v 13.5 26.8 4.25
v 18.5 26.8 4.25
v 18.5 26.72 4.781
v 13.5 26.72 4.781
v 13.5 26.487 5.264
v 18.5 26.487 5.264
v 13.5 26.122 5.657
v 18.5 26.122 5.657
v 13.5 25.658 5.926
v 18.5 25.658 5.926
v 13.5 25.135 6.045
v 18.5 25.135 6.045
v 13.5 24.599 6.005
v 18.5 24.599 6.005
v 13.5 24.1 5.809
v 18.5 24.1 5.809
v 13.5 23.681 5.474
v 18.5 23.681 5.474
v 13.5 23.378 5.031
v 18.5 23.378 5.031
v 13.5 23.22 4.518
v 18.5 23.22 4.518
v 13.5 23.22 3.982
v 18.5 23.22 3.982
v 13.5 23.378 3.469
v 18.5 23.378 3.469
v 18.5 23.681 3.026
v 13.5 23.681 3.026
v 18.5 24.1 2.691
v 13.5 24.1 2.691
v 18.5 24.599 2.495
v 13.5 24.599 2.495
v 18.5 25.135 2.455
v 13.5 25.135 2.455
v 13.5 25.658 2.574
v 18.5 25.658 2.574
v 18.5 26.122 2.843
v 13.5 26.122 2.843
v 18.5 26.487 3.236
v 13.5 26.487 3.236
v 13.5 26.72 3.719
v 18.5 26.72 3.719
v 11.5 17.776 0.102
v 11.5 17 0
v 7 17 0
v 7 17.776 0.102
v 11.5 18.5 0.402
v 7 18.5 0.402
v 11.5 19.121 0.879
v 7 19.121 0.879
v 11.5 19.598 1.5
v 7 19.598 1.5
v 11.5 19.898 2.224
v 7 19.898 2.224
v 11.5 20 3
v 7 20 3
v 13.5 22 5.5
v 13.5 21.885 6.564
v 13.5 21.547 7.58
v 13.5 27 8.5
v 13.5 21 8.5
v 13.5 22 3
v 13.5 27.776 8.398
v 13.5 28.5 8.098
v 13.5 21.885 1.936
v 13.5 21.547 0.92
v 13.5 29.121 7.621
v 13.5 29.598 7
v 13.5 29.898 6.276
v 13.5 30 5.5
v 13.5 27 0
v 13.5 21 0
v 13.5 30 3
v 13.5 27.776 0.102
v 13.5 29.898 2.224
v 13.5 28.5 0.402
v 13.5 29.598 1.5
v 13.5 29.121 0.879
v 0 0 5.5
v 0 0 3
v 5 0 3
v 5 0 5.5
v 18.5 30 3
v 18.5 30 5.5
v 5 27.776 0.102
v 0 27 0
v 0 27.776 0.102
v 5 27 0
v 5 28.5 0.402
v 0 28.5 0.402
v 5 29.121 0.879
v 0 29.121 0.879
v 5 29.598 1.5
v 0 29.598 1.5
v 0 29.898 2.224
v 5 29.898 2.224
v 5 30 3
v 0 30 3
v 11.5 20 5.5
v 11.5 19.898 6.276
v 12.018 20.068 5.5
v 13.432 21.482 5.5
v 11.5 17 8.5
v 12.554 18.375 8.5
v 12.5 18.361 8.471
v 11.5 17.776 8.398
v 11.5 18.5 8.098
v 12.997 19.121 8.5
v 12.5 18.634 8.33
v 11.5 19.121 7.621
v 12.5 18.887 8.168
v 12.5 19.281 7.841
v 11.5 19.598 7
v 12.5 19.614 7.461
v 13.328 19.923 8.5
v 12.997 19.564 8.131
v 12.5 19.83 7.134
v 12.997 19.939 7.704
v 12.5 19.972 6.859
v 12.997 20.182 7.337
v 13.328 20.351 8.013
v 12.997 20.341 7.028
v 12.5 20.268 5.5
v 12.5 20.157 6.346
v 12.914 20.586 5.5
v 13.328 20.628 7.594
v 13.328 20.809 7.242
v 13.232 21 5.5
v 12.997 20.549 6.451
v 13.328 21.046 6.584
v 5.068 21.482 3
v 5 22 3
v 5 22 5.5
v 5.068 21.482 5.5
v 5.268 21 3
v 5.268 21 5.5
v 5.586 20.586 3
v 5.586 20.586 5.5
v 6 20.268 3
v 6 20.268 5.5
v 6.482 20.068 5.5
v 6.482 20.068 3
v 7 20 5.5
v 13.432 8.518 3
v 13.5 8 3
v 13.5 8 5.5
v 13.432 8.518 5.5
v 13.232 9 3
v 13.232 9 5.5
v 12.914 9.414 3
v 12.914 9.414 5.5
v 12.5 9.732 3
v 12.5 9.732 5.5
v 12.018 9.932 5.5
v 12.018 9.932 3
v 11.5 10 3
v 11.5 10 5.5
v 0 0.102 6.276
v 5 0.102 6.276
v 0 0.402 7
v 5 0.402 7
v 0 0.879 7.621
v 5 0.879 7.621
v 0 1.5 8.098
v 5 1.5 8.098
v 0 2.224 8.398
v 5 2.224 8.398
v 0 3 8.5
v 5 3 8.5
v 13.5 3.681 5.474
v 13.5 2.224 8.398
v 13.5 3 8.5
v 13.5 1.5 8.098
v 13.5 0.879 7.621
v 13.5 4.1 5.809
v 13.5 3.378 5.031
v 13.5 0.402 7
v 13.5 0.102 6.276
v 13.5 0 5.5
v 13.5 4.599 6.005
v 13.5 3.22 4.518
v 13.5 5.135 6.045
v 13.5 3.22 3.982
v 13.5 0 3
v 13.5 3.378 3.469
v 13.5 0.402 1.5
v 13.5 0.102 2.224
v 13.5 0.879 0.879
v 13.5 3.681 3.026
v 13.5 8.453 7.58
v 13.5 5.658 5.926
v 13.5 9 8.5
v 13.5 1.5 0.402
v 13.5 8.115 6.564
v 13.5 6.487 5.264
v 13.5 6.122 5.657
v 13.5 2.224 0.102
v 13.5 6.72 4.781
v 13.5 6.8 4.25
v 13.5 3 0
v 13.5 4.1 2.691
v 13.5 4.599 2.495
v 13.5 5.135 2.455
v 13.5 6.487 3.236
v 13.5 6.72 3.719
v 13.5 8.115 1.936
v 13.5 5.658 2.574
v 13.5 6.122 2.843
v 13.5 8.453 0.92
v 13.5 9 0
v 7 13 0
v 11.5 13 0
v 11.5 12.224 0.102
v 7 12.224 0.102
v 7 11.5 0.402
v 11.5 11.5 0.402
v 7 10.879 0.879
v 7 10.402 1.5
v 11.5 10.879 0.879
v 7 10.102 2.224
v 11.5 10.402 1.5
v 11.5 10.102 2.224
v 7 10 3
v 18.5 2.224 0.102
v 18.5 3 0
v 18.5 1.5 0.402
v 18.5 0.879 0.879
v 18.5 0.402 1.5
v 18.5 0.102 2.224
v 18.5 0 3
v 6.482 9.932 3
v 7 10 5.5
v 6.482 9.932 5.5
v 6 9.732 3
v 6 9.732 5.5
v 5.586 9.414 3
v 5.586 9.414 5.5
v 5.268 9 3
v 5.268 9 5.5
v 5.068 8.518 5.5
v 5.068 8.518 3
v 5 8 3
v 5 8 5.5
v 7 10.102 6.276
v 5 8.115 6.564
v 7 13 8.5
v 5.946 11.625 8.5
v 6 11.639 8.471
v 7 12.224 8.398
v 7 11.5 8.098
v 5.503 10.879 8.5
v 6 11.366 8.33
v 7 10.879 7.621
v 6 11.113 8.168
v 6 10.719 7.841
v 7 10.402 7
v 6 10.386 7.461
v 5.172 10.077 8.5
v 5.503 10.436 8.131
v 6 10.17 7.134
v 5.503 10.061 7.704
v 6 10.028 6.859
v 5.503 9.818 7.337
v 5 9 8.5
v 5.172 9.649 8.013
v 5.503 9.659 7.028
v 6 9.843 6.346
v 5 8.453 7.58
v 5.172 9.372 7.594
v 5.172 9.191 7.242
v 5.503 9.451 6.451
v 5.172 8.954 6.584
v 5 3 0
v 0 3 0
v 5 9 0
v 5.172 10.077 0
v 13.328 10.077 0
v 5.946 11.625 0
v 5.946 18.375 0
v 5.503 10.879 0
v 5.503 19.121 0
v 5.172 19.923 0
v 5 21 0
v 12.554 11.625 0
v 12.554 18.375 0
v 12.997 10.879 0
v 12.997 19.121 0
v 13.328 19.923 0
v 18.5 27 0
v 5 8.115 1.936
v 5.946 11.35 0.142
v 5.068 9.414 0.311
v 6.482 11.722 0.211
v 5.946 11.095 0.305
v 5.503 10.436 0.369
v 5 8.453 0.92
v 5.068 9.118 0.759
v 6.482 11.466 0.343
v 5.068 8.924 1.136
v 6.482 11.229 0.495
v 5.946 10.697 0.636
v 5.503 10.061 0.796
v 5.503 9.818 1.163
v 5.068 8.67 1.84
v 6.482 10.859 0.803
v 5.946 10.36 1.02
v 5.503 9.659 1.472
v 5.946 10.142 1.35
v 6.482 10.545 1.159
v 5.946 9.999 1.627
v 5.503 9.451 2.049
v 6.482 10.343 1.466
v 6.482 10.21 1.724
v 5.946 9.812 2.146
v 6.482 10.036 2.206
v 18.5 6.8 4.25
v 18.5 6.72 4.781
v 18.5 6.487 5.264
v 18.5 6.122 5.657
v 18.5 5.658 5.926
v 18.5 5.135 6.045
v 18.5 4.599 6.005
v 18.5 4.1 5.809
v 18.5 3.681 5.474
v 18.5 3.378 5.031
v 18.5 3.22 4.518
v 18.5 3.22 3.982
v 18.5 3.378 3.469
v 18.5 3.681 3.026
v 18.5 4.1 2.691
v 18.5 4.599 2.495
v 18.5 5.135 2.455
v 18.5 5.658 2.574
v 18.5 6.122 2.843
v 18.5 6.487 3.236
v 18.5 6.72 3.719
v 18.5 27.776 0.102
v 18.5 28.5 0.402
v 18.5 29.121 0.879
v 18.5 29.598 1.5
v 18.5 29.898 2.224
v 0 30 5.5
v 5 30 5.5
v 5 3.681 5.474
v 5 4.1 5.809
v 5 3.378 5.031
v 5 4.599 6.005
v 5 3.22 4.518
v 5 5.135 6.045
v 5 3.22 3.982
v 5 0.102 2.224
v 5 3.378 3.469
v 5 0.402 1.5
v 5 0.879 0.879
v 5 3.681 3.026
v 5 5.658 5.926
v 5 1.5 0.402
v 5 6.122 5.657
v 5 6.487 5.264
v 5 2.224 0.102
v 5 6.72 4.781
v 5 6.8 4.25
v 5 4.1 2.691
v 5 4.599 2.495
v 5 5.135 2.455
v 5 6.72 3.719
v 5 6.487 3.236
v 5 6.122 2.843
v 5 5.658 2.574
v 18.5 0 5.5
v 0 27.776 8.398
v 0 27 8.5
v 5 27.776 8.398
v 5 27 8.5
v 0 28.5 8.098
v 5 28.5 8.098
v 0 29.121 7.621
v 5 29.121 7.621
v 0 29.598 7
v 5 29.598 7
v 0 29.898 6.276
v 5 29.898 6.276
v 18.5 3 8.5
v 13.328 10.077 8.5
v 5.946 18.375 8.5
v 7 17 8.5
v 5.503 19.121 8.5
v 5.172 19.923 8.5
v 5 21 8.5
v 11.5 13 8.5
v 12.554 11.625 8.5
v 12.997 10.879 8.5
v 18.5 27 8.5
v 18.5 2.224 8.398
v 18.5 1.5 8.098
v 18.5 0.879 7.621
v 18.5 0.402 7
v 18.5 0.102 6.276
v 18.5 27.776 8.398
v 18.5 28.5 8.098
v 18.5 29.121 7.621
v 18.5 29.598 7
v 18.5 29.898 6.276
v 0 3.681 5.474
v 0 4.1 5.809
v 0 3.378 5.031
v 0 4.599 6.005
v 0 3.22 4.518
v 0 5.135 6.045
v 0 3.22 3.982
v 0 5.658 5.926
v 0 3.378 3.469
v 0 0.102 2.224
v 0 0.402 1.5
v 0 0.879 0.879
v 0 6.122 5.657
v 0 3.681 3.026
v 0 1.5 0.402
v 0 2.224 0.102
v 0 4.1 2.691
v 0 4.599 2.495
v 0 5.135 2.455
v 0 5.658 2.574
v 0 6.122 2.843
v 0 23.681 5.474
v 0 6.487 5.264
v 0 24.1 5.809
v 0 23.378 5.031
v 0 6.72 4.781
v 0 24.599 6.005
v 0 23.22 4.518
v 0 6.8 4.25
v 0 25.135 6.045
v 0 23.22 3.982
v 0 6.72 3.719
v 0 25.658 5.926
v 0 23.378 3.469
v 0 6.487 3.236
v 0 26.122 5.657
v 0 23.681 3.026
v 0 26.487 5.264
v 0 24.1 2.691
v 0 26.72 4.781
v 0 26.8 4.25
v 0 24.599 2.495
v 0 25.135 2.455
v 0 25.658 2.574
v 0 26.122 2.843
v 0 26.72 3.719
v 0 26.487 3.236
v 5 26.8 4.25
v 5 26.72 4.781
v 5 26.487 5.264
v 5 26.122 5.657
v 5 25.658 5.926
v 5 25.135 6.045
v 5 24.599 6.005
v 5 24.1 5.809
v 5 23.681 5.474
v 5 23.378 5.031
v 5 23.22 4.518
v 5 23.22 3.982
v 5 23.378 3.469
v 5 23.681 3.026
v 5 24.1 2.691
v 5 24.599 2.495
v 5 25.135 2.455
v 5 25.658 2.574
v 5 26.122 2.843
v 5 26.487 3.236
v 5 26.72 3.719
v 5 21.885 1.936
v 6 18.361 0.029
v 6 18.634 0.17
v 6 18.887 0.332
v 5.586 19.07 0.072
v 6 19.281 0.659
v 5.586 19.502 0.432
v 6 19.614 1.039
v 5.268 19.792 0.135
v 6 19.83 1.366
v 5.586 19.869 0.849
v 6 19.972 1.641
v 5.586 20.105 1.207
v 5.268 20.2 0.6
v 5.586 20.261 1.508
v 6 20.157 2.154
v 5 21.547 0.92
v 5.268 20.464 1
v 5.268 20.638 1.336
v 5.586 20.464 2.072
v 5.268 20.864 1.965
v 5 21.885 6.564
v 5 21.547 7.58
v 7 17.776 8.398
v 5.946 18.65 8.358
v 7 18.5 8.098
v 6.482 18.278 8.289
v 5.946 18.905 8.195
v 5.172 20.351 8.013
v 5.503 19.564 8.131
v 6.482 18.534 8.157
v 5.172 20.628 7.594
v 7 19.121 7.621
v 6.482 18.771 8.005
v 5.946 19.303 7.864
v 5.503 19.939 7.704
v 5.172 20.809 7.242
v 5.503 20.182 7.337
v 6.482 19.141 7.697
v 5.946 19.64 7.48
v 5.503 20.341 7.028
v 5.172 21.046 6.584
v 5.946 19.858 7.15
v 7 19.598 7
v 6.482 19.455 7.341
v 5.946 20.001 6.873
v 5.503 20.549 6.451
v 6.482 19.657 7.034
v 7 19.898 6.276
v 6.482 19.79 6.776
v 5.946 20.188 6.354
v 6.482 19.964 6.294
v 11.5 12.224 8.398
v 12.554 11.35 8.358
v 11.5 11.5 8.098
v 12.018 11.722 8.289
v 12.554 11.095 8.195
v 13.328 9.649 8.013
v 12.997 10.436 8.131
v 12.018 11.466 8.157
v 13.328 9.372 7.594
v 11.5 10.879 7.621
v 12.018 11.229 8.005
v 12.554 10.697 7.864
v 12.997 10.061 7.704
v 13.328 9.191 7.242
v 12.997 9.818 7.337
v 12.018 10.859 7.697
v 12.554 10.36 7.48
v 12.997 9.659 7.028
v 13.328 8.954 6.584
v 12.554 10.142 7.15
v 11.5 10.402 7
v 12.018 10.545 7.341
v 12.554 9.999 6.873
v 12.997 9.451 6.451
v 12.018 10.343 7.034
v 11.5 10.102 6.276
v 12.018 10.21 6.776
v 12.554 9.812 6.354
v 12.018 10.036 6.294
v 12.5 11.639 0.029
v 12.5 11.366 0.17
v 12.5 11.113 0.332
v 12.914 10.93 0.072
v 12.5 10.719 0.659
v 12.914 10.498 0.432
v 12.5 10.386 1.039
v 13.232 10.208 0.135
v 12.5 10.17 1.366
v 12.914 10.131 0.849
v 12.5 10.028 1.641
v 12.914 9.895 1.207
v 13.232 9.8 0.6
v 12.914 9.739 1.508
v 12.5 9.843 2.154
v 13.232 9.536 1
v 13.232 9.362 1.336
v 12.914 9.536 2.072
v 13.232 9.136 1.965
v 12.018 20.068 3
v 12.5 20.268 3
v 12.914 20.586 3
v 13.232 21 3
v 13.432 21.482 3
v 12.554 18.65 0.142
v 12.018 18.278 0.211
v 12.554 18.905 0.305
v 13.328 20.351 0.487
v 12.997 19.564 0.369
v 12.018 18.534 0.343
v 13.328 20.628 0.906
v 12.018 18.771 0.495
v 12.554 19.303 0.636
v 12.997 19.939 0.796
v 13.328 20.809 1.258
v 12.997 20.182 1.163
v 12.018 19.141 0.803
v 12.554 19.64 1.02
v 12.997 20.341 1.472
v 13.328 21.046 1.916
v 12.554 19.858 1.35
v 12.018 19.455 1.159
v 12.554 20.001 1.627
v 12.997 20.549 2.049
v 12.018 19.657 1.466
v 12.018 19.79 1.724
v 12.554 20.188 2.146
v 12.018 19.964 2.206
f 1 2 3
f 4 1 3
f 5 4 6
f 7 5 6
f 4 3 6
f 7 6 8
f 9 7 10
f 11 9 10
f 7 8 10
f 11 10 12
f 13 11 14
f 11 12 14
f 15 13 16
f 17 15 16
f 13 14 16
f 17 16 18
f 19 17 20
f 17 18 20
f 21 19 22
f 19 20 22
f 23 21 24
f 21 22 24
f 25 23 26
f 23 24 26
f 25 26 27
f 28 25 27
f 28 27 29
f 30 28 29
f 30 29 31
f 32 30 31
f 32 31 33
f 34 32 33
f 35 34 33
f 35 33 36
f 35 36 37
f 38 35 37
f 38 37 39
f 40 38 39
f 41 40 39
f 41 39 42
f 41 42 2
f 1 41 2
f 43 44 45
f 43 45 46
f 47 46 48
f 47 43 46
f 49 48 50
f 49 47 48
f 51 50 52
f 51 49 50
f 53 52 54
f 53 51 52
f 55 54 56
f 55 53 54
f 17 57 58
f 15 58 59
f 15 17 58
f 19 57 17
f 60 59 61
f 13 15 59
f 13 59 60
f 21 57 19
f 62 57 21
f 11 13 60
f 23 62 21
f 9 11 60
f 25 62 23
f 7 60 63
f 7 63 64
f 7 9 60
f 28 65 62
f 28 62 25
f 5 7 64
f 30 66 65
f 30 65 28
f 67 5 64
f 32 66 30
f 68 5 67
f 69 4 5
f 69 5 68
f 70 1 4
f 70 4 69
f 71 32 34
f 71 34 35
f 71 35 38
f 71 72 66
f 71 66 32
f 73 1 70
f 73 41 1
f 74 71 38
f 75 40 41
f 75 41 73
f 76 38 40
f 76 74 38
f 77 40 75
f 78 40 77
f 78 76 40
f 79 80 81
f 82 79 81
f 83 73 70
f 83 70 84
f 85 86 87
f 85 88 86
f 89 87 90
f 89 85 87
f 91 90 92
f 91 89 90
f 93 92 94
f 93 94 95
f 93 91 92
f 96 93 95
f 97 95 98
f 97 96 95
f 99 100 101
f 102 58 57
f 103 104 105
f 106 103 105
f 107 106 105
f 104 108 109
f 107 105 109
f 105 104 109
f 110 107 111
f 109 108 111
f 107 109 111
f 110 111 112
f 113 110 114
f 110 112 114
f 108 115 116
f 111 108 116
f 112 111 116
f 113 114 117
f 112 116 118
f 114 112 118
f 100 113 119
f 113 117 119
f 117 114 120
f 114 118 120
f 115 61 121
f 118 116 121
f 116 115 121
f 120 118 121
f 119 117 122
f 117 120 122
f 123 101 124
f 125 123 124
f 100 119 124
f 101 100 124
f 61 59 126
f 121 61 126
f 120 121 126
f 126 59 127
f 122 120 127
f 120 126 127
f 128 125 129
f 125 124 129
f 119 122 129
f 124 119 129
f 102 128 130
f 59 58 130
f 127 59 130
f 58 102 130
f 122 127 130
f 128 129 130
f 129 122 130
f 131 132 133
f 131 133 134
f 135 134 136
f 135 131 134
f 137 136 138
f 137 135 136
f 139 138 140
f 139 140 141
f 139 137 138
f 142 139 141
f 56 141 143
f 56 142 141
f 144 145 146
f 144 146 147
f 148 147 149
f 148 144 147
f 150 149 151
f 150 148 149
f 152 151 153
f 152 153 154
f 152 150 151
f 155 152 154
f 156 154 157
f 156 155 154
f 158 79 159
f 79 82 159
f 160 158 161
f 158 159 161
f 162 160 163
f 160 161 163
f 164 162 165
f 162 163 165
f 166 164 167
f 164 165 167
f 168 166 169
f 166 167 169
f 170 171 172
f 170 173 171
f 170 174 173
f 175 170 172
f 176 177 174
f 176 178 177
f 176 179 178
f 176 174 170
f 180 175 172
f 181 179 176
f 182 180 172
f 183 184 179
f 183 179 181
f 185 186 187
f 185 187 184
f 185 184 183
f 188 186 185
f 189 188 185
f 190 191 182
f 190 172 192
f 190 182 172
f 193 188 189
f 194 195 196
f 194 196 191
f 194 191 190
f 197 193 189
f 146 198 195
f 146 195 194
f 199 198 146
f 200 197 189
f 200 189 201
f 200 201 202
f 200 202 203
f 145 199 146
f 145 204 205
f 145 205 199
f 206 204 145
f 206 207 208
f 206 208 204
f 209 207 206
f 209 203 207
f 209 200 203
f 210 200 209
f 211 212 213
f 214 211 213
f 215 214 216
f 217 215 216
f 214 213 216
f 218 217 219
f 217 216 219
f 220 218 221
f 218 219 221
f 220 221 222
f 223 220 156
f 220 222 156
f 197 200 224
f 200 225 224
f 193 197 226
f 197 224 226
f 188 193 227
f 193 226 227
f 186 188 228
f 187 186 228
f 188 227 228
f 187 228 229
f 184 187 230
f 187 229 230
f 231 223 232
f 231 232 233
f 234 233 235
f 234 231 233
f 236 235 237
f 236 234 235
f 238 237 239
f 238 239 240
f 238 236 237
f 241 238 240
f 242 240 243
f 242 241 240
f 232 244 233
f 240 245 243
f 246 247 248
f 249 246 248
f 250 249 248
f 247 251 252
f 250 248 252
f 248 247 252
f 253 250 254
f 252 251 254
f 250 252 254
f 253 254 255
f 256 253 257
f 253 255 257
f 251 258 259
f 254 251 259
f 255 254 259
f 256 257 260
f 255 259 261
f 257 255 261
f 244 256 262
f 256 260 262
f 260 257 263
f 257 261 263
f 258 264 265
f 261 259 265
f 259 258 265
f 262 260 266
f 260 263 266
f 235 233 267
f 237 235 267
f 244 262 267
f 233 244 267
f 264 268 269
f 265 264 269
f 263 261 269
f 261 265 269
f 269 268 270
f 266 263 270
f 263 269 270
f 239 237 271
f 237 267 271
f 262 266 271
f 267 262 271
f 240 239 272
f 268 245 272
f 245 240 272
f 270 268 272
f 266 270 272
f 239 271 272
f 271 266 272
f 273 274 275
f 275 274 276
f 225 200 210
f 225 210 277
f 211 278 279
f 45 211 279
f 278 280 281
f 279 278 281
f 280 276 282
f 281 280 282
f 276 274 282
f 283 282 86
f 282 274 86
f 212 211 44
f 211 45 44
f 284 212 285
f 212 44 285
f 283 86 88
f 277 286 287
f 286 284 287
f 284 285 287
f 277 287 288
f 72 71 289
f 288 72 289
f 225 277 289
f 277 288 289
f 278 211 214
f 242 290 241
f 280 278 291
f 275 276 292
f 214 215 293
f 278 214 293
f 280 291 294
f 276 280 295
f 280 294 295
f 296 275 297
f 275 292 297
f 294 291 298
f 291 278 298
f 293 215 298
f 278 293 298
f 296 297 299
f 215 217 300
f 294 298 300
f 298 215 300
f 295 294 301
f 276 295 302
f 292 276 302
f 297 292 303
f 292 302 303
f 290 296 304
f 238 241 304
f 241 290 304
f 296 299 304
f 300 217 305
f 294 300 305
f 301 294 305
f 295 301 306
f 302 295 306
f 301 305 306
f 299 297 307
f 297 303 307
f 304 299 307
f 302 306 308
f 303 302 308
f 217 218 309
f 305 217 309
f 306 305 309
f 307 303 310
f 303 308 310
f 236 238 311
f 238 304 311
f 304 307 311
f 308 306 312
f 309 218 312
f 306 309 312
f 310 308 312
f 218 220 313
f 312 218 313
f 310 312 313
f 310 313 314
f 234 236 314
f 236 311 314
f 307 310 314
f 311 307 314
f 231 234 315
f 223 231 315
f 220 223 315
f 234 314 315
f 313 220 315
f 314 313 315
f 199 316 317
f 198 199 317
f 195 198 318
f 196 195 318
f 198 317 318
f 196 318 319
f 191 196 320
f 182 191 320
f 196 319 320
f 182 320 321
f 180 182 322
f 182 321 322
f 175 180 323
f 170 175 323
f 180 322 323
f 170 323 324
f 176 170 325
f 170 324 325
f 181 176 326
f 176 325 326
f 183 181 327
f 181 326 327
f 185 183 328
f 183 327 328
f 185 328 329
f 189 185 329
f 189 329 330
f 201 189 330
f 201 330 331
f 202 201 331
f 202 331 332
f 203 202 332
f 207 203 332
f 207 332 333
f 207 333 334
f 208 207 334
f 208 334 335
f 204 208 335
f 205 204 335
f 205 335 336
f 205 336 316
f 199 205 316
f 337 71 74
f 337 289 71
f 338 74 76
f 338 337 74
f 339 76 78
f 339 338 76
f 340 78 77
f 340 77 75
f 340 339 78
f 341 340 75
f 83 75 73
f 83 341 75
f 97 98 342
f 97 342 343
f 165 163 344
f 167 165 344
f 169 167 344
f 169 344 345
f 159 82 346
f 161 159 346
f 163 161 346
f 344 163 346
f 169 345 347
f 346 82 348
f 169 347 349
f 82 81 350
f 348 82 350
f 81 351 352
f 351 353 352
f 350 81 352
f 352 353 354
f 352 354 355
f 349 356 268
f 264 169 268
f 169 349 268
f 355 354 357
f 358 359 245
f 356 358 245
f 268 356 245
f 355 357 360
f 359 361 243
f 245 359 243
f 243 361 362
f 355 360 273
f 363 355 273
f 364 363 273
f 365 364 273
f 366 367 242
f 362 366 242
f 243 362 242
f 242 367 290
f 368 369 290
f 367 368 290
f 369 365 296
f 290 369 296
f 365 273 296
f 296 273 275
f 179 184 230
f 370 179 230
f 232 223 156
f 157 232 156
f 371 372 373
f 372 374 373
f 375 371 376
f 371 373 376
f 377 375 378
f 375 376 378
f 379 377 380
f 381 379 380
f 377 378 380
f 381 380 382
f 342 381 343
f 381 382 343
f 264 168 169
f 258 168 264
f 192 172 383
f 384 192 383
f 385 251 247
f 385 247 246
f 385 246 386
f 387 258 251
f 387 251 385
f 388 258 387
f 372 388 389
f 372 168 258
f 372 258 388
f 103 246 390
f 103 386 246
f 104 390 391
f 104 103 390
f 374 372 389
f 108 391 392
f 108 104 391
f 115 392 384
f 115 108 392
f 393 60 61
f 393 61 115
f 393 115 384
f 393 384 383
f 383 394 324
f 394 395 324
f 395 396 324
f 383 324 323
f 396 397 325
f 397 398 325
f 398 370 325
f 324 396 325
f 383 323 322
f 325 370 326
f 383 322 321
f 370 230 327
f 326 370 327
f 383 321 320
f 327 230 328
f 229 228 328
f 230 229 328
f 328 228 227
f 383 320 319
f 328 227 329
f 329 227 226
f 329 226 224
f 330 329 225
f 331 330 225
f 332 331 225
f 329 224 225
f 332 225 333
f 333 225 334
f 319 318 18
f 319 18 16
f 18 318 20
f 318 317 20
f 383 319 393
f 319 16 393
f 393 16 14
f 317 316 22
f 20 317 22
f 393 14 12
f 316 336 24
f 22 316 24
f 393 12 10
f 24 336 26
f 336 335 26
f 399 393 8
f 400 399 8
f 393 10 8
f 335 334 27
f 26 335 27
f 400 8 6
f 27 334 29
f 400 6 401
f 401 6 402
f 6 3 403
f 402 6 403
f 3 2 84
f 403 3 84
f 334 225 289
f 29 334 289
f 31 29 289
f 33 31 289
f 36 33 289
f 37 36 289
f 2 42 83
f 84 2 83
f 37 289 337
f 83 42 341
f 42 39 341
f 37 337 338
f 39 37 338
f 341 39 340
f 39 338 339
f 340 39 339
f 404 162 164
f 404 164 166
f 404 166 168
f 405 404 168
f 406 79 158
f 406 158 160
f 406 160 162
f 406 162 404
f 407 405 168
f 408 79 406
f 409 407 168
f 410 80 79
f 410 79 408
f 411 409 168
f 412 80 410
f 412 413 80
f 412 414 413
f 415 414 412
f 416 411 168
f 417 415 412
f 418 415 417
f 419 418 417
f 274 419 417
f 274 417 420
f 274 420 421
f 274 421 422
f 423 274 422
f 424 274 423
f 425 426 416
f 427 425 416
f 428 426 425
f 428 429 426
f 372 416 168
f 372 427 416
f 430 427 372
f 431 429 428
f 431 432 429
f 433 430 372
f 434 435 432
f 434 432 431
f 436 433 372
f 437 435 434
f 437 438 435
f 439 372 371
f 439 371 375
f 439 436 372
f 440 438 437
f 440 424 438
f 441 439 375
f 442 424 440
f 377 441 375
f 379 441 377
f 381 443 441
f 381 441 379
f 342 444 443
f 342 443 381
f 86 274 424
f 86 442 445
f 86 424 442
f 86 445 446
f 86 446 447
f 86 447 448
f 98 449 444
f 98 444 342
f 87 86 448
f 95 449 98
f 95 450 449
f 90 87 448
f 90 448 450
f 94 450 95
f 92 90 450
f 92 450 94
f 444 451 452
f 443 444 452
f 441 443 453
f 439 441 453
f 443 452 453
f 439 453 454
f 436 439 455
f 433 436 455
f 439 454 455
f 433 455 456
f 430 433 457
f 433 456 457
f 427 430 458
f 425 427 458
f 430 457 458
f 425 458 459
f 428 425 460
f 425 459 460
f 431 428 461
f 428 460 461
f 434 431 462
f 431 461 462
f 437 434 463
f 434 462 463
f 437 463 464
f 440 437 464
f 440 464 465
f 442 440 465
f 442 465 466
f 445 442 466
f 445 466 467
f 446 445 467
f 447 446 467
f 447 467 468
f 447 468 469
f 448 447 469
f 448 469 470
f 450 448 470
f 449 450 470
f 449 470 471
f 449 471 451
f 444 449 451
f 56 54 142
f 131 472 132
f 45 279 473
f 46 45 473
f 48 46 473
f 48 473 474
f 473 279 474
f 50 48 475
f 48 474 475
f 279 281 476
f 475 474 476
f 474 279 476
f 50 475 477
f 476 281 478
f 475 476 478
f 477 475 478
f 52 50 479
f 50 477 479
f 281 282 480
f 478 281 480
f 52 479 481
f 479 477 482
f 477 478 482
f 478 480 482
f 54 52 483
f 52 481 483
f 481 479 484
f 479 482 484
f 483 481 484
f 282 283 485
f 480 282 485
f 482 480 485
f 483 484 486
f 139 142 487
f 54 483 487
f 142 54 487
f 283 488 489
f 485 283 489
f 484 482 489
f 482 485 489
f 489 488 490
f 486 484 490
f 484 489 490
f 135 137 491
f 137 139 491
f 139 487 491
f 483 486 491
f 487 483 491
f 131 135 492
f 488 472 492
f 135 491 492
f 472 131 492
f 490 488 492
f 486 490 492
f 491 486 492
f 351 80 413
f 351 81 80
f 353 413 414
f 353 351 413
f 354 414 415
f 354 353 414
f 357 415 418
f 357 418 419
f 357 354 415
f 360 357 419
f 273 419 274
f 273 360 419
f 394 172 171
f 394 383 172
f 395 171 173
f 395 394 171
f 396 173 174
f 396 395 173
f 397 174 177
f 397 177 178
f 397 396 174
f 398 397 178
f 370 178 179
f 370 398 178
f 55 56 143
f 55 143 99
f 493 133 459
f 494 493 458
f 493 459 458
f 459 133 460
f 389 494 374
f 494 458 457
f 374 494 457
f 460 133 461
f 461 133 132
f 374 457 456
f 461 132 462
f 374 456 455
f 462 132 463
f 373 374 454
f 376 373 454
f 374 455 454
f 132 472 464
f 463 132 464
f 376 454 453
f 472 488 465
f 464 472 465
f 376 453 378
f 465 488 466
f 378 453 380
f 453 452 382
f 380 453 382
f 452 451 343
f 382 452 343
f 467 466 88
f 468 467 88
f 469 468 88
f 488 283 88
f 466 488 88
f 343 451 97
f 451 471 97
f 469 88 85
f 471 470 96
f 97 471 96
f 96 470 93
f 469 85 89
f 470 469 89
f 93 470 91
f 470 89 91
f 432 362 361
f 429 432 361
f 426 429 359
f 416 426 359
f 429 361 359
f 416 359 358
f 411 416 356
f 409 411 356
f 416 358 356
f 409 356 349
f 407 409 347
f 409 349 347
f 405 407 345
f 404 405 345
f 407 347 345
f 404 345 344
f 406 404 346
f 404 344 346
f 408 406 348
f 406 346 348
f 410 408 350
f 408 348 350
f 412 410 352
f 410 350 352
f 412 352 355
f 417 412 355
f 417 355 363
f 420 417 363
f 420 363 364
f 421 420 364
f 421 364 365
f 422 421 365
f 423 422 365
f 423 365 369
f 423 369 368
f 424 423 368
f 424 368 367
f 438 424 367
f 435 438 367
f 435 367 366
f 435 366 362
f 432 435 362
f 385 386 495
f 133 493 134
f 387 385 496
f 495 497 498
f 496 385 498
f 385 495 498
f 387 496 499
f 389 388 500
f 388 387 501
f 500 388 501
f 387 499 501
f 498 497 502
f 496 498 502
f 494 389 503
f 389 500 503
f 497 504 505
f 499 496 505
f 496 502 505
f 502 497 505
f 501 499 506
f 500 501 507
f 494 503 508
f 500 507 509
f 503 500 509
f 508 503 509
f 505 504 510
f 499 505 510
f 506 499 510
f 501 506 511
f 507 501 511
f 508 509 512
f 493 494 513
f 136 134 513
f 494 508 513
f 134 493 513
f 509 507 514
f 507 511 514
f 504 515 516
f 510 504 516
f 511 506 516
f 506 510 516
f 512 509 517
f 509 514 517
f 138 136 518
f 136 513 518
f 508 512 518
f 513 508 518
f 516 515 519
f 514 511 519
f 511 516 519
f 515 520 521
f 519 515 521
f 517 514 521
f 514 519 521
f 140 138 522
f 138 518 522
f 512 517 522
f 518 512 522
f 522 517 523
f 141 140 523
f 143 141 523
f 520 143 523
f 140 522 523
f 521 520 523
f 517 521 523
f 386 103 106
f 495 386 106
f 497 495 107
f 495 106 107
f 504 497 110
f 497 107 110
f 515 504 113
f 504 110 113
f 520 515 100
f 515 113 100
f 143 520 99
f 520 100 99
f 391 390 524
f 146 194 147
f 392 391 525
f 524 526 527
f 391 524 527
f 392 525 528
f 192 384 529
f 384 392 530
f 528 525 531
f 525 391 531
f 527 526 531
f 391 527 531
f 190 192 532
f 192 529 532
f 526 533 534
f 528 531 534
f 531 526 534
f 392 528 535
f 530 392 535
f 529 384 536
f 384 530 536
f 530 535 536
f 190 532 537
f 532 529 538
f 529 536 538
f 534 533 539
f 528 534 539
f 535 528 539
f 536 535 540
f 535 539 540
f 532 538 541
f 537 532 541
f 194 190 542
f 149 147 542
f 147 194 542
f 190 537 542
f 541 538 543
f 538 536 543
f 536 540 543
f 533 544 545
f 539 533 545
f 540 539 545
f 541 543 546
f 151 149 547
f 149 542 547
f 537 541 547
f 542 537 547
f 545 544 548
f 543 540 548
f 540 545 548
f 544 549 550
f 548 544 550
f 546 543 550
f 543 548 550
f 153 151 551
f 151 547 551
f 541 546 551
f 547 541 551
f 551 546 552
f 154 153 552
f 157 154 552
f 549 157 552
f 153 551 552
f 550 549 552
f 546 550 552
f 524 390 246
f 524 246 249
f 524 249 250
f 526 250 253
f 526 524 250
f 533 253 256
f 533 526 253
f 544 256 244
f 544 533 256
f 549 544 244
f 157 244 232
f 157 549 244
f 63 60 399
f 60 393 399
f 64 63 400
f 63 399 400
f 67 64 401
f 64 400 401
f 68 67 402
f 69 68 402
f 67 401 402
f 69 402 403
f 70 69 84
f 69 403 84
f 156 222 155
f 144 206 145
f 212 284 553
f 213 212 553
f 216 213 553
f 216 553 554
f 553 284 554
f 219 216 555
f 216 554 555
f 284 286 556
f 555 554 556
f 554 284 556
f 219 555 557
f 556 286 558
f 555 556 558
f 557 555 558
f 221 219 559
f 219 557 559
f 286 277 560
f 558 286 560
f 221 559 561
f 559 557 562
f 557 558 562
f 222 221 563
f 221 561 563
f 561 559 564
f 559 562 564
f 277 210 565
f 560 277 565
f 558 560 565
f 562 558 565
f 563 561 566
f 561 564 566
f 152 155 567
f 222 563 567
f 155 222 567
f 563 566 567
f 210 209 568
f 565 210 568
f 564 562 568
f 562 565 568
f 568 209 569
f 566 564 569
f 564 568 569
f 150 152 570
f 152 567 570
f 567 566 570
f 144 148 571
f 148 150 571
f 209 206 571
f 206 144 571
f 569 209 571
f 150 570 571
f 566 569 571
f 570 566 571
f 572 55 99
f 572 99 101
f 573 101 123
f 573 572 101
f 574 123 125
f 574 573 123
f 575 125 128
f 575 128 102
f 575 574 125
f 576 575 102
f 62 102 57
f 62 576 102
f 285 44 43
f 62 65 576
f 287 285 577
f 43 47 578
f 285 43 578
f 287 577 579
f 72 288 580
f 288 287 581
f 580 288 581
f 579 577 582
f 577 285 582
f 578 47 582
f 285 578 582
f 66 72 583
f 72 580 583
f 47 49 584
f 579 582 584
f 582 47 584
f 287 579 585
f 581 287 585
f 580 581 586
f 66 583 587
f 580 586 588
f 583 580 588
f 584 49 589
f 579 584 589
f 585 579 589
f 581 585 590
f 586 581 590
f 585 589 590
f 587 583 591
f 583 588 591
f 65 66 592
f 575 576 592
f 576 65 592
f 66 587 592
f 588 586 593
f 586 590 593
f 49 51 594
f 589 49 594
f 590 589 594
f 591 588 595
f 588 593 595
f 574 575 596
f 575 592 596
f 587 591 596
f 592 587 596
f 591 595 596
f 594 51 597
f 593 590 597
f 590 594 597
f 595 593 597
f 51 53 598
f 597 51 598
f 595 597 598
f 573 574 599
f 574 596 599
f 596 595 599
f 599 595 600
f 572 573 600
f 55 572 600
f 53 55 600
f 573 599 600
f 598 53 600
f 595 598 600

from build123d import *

# Parameters (mm, degrees)
ESQUISSE1_W             = 5
ESQUISSE1_H             = 30
ESQUISSE1_W_2           = 8.5
ESQUISSE1_H_2           = 10
BOSS_EXTRU_1_DEPTH      = 8.5
ESQUISSE2_R             = 1.8
ENL_V_MAT_EXTRU_1_DEPTH = 20
CONG_3_R                = 3
CONG_1_R                = 2


with BuildPart() as part:
    # Esquisse1 → Boss.-Extru.1 (new body)
    with BuildSketch(Plane.XY):
        with Locations((2.5, 15)):
            Rectangle(ESQUISSE1_W, ESQUISSE1_H)
        with Locations((16, 15)):
            Rectangle(ESQUISSE1_W, ESQUISSE1_H)
        with Locations((9.25, 15)):
            Rectangle(ESQUISSE1_W_2, ESQUISSE1_H_2)
    extrude(amount=BOSS_EXTRU_1_DEPTH)

    # Esquisse2 → Enlèv. mat.-Extru.1 (cut)
    with BuildSketch(Plane(origin=(18.5, 0, 0), x_dir=(0, 0, -1), z_dir=(1, 0, 0))):
        with Locations(Location((-4.25, 25, 0), (0, 0, 90))):
            Circle(ESQUISSE2_R)
        with Locations(Location((-4.25, 5, 0), (0, 0, 90))):
            Circle(ESQUISSE2_R)
    extrude(amount=-ENL_V_MAT_EXTRU_1_DEPTH, mode=Mode.SUBTRACT)

    # Congé3
    cong_3_edges = [part.edges().sort_by_distance(p)[0] for p in [
        (2.5, 30, 8.5),
        (9.25, 20, 0),
        (16, 30, 0),
        (16, 0, 0),
        (9.25, 10, 0),
        (2.5, 0, 0),
        (2.5, 30, 0),
        (2.5, 0, 8.5),
        (9.25, 10, 8.5),
        (16, 0, 8.5),
        (16, 30, 8.5),
        (9.25, 20, 8.5),
    ]]
    fillet(cong_3_edges, radius=CONG_3_R)

    # Congé1
    # the kernel refuses this fillet: 2 mm, written as the material it adds along each edge
    with BuildSketch(Plane(origin=(13.5, 10, 3), x_dir=(0, -1, 0), z_dir=(0, 0, 1)), Plane(origin=(5, 20, 3), x_dir=(0, 1, 0), z_dir=(0, 0, 1))) as cong_1_piece_1:
        with BuildLine():
            CenterArc((CONG_1_R, -CONG_1_R), CONG_1_R, 90, 90)
            Line((0, -CONG_1_R), (0, 0))
            Line((0, 0), (CONG_1_R, 0))
        make_face()
    extrude(amount=2.5)
    with BuildSketch(Plane(origin=(13.5, 17, 3), x_dir=(0, -0.9953436464450918, 0.09638996566753391), z_dir=(0, 0.09638996566753391, 0.9953436464450918))) as cong_1_piece_2_section:
        with BuildLine():
            CenterArc((3 + CONG_1_R, -CONG_1_R), CONG_1_R, 90, 90)
            Line((3, -CONG_1_R), (3, 0))
            Line((3, 0), (3 + CONG_1_R, 0))
        make_face()
    cong_1_piece_2 = revolve(axis=Axis((13.5, 17, 3), (1, 0, 0)), revolution_arc=185.531326158, mode=Mode.PRIVATE)
    cong_1_piece_2 = split(cong_1_piece_2, bisect_by=Plane(origin=(12.926399559, 19.220886719, 0), z_dir=(0, 0, 1)), keep=Keep.TOP, mode=Mode.PRIVATE)
    add(cong_1_piece_2)
    with BuildSketch(Plane(origin=(5, 17, 3), x_dir=(0, -0.9953436464450918, 0.09638996566753227), z_dir=(0, 0.09638996566753227, 0.9953436464450918))) as cong_1_piece_3_section:
        with BuildLine():
            CenterArc((3 + CONG_1_R, CONG_1_R), CONG_1_R, 180, 90)
            Line((3 + CONG_1_R, 0), (3, 0))
            Line((3, 0), (3, CONG_1_R))
        make_face()
    cong_1_piece_3 = revolve(axis=Axis((5, 17, 3), (1, 0, 0)), revolution_arc=185.531326158, mode=Mode.PRIVATE)
    cong_1_piece_3 = split(cong_1_piece_3, bisect_by=Plane(origin=(5.573600437, 19.220886663, 0), z_dir=(0, 0, 1)), keep=Keep.TOP, mode=Mode.PRIVATE)
    add(cong_1_piece_3)
    with BuildSketch(Plane(origin=(13.5, 13, 3), x_dir=(0, 0.9953436464450918, 0.09638996566753272), z_dir=(0, -0.09638996566753272, 0.9953436464450918))) as cong_1_piece_4_section:
        with BuildLine():
            CenterArc((3 + CONG_1_R, CONG_1_R), CONG_1_R, 180, 90)
            Line((3 + CONG_1_R, 0), (3, 0))
            Line((3, 0), (3, CONG_1_R))
        make_face()
    cong_1_piece_4 = revolve(axis=Axis((13.5, 13, 3), (-1, 0, 0)), revolution_arc=185.531326158, mode=Mode.PRIVATE)
    cong_1_piece_4 = split(cong_1_piece_4, bisect_by=Plane(origin=(12.926399561, 10.779113284, 0), z_dir=(0, 0, 1)), keep=Keep.TOP, mode=Mode.PRIVATE)
    add(cong_1_piece_4)
    with BuildSketch(Plane(origin=(5, 13, 3), x_dir=(0, 0.9953436464450918, 0.09638996566753391), z_dir=(0, -0.09638996566753391, 0.9953436464450918))) as cong_1_piece_5_section:
        with BuildLine():
            CenterArc((3 + CONG_1_R, -CONG_1_R), CONG_1_R, 90, 90)
            Line((3, -CONG_1_R), (3, 0))
            Line((3, 0), (3 + CONG_1_R, 0))
        make_face()
    cong_1_piece_5 = revolve(axis=Axis((5, 13, 3), (-1, 0, 0)), revolution_arc=185.531326158, mode=Mode.PRIVATE)
    cong_1_piece_5 = split(cong_1_piece_5, bisect_by=Plane(origin=(5.573600429, 10.779113281, 0), z_dir=(0, 0, 1)), keep=Keep.TOP, mode=Mode.PRIVATE)
    add(cong_1_piece_5)
    with BuildSketch(Plane(origin=(13.5, 17, 5.5), x_dir=(0, -0.9953436464450917, -0.09638996566753434), z_dir=(0, 0.09638996566753434, -0.9953436464450917))) as cong_1_piece_6_section:
        with BuildLine():
            CenterArc((3 + CONG_1_R, CONG_1_R), CONG_1_R, 180, 90)
            Line((3, CONG_1_R), (3, 0))
            Line((3, 0), (3 + CONG_1_R, 0))
        make_face()
    cong_1_piece_6 = revolve(axis=Axis((13.5, 17, 5.5), (-1, 0, 0)), revolution_arc=185.531326158, mode=Mode.PRIVATE)
    cong_1_piece_6 = split(cong_1_piece_6, bisect_by=Plane(origin=(12.92639966, 19.220886752, 8.5), z_dir=(0, 0, -1)), keep=Keep.TOP, mode=Mode.PRIVATE)
    add(cong_1_piece_6)
    with BuildSketch(Plane(origin=(5, 17, 5.5), x_dir=(0, -0.9953436464450918, -0.09638996566753258), z_dir=(0, 0.09638996566753258, -0.9953436464450918))) as cong_1_piece_7_section:
        with BuildLine():
            CenterArc((3 + CONG_1_R, -CONG_1_R), CONG_1_R, 90, 90)
            Line((3, -CONG_1_R), (3, 0))
            Line((3, 0), (3 + CONG_1_R, 0))
        make_face()
    cong_1_piece_7 = revolve(axis=Axis((5, 17, 5.5), (-1, 0, 0)), revolution_arc=185.531326158, mode=Mode.PRIVATE)
    cong_1_piece_7 = split(cong_1_piece_7, bisect_by=Plane(origin=(5.573251137, 19.22118781, 8.5), z_dir=(0, 0, -1)), keep=Keep.TOP, mode=Mode.PRIVATE)
    add(cong_1_piece_7)
    with BuildSketch(Plane(origin=(13.5, 13, 5.5), x_dir=(0, 0.9953436464450918, -0.09638996566753316), z_dir=(0, -0.09638996566753316, -0.9953436464450918))) as cong_1_piece_8_section:
        with BuildLine():
            CenterArc((3 + CONG_1_R, -CONG_1_R), CONG_1_R, 90, 90)
            Line((3, -CONG_1_R), (3, 0))
            Line((3, 0), (3 + CONG_1_R, 0))
        make_face()
    cong_1_piece_8 = revolve(axis=Axis((13.5, 13, 5.5), (1, 0, 0)), revolution_arc=185.531326158, mode=Mode.PRIVATE)
    cong_1_piece_8 = split(cong_1_piece_8, bisect_by=Plane(origin=(12.926652362, 10.77922389, 8.5), z_dir=(0, 0, -1)), keep=Keep.TOP, mode=Mode.PRIVATE)
    add(cong_1_piece_8)
    with BuildSketch(Plane(origin=(5, 13, 5.5), x_dir=(0, 0.9953436464450917, -0.09638996566753434), z_dir=(0, -0.09638996566753434, -0.9953436464450917))) as cong_1_piece_9_section:
        with BuildLine():
            CenterArc((3 + CONG_1_R, CONG_1_R), CONG_1_R, 180, 90)
            Line((3, CONG_1_R), (3, 0))
            Line((3, 0), (3 + CONG_1_R, 0))
        make_face()
    cong_1_piece_9 = revolve(axis=Axis((5, 13, 5.5), (1, 0, 0)), revolution_arc=185.531326158, mode=Mode.PRIVATE)
    cong_1_piece_9 = split(cong_1_piece_9, bisect_by=Plane(origin=(5.573600352, 10.779113305, 8.5), z_dir=(0, 0, -1)), keep=Keep.TOP, mode=Mode.PRIVATE)
    add(cong_1_piece_9)
    with BuildSketch(Plane(origin=(13.5, 20, 3), x_dir=(0, 1, 0), z_dir=(0, 0, 1)), Plane(origin=(5, 10, 3), x_dir=(0, -1, 0), z_dir=(0, 0, 1))) as cong_1_piece_10:
        with BuildLine():
            CenterArc((CONG_1_R, CONG_1_R), CONG_1_R, 180, 90)
            Line((0, CONG_1_R), (0, 0))
            Line((0, 0), (CONG_1_R, 0))
        make_face()
    extrude(amount=2.5)


solid = part.part
